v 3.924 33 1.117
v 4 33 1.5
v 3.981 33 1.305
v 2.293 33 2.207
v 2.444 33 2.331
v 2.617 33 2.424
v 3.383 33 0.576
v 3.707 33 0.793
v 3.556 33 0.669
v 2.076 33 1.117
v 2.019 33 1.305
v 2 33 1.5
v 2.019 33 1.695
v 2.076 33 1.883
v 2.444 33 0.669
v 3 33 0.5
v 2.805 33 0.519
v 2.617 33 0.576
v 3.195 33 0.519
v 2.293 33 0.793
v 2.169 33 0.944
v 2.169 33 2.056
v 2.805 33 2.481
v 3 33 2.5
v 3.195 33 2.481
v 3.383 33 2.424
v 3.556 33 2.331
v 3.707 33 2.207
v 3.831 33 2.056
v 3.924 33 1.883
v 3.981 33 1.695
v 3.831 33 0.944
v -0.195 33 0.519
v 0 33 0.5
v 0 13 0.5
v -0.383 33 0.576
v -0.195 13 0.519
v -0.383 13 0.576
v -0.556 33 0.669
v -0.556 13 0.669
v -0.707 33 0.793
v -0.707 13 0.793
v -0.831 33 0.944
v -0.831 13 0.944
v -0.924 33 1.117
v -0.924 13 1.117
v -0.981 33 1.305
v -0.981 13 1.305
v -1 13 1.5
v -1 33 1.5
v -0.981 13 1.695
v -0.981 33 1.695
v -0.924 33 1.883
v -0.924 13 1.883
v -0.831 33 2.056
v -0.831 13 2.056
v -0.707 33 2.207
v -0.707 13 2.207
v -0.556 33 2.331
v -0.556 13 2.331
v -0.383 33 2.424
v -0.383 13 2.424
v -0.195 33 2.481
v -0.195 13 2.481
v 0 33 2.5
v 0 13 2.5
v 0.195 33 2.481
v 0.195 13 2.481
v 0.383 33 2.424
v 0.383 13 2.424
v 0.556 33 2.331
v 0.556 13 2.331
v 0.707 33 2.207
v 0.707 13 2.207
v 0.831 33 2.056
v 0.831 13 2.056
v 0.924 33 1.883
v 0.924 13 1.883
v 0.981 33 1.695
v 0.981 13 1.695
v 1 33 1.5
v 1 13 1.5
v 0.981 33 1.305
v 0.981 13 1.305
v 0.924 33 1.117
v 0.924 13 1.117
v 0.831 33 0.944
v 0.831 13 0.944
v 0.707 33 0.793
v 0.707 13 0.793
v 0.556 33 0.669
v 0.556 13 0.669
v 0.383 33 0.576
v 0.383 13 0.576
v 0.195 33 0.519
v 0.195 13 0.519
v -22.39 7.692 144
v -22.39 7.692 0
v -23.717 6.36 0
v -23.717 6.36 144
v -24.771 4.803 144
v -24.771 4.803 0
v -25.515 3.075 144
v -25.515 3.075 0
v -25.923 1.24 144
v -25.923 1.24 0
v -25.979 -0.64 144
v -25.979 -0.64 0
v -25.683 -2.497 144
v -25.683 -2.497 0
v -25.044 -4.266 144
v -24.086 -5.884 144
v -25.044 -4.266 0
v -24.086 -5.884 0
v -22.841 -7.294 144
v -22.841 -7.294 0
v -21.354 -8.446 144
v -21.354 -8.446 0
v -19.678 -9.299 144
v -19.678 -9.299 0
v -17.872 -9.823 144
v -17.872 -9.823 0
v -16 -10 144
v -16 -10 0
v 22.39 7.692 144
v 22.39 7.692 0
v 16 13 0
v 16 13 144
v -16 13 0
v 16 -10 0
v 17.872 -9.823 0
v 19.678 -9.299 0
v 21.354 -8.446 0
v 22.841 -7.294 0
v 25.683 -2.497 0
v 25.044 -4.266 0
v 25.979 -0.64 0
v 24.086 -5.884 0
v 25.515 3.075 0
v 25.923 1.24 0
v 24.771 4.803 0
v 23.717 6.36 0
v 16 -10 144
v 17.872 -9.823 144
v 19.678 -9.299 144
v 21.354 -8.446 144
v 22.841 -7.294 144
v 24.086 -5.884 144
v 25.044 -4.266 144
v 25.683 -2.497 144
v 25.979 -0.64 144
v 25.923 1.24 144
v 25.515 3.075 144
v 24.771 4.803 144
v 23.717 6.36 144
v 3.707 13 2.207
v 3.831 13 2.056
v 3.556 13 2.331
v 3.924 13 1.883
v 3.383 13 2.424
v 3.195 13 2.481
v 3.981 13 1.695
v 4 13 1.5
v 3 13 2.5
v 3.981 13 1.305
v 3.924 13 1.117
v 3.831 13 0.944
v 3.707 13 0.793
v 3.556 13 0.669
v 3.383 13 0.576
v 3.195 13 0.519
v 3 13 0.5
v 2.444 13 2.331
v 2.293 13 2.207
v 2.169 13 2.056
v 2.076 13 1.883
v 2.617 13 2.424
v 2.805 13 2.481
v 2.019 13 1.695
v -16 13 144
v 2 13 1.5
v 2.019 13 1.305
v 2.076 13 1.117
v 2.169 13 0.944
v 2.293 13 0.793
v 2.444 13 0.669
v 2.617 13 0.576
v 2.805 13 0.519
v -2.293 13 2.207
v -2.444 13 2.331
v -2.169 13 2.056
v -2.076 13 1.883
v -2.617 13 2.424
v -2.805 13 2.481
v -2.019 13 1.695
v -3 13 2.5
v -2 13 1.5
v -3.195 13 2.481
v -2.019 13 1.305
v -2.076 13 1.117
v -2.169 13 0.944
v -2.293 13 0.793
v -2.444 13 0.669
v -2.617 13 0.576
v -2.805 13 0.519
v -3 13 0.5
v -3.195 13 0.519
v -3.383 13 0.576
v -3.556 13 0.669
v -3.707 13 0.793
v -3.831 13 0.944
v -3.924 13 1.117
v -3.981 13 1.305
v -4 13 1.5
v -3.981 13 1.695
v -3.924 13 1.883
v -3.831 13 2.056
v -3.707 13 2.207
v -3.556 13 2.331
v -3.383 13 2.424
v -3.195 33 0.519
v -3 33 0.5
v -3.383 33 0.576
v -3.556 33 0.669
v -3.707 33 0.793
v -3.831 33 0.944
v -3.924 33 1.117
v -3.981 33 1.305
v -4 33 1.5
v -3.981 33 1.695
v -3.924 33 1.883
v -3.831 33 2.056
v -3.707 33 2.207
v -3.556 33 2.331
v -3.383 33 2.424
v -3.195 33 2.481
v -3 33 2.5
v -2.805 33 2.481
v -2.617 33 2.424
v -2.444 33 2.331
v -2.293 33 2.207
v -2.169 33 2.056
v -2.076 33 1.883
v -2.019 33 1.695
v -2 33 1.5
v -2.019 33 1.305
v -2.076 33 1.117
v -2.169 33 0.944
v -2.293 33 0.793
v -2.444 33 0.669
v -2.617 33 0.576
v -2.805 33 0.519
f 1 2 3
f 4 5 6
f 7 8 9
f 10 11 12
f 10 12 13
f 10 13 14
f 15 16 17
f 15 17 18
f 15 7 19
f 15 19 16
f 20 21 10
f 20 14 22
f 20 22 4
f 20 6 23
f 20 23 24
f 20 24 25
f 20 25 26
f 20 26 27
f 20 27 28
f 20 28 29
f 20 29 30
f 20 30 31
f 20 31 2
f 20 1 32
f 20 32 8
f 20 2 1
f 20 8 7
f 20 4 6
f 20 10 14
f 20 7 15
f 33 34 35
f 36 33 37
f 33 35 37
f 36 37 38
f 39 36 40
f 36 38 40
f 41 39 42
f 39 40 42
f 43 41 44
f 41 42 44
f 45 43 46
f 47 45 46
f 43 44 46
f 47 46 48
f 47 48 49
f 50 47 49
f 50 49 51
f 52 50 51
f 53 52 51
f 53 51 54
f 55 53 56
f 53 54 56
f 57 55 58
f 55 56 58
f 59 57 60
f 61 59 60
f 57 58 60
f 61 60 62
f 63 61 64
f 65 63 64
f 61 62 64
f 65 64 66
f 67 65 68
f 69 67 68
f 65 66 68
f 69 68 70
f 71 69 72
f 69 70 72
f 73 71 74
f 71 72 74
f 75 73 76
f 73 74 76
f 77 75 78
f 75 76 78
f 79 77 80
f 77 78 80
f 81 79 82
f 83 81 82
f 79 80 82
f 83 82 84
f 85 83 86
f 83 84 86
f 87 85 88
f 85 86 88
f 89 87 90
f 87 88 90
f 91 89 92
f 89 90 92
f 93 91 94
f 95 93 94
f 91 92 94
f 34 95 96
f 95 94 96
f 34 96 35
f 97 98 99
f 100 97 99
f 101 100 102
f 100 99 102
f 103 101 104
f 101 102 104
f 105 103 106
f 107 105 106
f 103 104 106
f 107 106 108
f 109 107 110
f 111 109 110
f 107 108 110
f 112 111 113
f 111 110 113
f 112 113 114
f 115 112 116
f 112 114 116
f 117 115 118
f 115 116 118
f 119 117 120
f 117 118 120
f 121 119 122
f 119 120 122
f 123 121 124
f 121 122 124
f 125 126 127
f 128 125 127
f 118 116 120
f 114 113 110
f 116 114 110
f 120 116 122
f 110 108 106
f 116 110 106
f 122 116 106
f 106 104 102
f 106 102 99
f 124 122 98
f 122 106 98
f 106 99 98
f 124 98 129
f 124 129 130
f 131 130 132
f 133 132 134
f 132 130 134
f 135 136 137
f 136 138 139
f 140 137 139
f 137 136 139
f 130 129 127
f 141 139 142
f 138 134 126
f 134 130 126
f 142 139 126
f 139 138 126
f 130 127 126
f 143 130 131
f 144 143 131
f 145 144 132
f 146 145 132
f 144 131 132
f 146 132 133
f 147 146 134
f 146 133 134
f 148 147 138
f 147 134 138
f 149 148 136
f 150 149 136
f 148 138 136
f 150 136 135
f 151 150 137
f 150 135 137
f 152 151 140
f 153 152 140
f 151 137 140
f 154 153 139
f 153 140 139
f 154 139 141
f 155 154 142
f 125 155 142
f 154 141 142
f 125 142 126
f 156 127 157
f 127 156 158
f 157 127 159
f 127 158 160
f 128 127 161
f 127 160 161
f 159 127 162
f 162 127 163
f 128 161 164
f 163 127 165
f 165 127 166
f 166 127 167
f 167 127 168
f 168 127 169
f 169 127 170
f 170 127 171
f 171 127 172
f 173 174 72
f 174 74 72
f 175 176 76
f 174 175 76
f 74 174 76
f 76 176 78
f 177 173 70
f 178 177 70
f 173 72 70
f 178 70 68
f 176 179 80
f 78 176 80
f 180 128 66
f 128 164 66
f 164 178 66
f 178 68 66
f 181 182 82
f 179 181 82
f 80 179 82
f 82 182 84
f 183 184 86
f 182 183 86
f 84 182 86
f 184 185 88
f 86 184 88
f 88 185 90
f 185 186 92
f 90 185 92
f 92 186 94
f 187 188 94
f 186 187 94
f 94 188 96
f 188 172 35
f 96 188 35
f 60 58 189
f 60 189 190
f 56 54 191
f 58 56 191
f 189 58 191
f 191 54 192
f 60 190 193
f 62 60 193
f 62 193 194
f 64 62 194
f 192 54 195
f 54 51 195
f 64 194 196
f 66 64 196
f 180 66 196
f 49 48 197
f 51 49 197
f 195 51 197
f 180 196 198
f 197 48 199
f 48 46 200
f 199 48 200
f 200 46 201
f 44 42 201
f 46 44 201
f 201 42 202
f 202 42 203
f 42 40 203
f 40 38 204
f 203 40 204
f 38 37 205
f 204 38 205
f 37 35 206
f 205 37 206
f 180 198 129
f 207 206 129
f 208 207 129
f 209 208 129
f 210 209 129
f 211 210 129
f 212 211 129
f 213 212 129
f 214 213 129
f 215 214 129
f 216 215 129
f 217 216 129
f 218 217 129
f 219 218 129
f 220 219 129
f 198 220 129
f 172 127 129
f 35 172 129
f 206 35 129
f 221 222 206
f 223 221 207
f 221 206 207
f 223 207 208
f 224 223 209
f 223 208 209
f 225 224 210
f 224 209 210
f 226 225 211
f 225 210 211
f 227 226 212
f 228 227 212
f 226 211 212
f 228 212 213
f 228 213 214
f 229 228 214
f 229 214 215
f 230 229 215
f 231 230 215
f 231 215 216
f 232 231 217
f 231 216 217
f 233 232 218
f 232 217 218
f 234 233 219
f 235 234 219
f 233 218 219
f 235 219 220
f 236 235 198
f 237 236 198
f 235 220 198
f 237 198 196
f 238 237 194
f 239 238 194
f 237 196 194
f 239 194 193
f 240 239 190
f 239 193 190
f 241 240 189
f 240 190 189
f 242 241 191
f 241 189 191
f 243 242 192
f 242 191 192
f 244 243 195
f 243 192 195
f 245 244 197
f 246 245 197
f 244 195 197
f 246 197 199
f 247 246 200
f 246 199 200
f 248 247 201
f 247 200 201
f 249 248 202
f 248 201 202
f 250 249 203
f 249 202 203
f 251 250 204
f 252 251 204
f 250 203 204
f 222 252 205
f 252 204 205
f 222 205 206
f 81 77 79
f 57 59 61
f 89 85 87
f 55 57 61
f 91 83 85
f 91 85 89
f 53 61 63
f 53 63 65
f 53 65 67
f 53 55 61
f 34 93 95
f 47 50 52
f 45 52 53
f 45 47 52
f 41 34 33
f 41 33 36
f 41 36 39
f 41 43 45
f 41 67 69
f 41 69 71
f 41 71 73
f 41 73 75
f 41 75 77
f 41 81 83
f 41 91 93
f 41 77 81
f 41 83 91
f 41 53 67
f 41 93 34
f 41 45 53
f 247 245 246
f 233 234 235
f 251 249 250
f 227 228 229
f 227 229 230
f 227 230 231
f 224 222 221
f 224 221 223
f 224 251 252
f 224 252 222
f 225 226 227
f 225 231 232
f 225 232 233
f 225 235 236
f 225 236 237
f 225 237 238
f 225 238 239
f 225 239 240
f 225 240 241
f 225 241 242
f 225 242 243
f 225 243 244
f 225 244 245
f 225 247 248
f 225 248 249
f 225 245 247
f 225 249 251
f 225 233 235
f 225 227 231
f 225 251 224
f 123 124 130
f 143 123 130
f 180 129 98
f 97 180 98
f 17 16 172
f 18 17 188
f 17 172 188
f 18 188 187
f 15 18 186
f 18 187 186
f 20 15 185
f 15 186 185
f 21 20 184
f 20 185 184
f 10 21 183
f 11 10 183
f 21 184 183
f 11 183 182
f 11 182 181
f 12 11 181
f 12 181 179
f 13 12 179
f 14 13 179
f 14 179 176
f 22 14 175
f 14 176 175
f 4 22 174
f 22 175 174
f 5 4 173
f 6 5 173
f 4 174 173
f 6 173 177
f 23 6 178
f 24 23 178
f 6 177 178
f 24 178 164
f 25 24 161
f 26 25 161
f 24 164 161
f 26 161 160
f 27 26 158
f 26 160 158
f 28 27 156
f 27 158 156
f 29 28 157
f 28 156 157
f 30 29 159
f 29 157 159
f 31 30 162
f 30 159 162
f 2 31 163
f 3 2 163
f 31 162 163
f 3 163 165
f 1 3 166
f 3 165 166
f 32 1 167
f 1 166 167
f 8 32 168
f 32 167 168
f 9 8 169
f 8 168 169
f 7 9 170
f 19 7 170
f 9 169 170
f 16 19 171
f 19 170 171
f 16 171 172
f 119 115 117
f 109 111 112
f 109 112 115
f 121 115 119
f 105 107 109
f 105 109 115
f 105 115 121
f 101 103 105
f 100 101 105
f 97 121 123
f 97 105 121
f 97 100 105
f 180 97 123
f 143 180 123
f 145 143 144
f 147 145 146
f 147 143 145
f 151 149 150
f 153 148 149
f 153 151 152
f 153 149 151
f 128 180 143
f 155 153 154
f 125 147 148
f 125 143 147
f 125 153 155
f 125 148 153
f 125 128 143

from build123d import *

# Parameters (mm, degrees)
EXTRUDE_1_DEPTH = 144
SKETCH_2_R      = 1
EXTRUDE_2_DEPTH = 20


with BuildPart() as part:
    # 스케치1 → 보스-돌출1 (new body)
    with BuildSketch(Plane.XY):
        with BuildLine():
            Line((-16, -10), (16, -10))
            ThreePointArc((16, -10), (25.405398904, -3.396832561), (22.38971305, 7.69230571))
            Line((22.38971305, 7.69230571), (16.000004032, 13))
            Line((16.000004032, 13), (-16, 13))
            Line((-16, 13), (-22.389710664, 7.692307692))
            ThreePointArc((-22.389710664, 7.692307692), (-25.405399431, -3.396831102), (-16, -10))
        make_face()
    extrude(amount=EXTRUDE_1_DEPTH)

    # 스케치2 → 보스-돌출2 (add)
    with BuildSketch(Plane(origin=(0, 13, 0), x_dir=(1, 0, 0), z_dir=(0, 1, 0))):
        with Locations(Location((-3, -1.5, 0), (0, 0, 90))):
            Circle(SKETCH_2_R)
        with Locations(Location((0, -1.5, 0), (0, 0, 90))):
            Circle(SKETCH_2_R)
        with Locations(Location((3, -1.5, 0), (0, 0, 90))):
            Circle(SKETCH_2_R)
    extrude(amount=EXTRUDE_2_DEPTH)


solid = part.part
